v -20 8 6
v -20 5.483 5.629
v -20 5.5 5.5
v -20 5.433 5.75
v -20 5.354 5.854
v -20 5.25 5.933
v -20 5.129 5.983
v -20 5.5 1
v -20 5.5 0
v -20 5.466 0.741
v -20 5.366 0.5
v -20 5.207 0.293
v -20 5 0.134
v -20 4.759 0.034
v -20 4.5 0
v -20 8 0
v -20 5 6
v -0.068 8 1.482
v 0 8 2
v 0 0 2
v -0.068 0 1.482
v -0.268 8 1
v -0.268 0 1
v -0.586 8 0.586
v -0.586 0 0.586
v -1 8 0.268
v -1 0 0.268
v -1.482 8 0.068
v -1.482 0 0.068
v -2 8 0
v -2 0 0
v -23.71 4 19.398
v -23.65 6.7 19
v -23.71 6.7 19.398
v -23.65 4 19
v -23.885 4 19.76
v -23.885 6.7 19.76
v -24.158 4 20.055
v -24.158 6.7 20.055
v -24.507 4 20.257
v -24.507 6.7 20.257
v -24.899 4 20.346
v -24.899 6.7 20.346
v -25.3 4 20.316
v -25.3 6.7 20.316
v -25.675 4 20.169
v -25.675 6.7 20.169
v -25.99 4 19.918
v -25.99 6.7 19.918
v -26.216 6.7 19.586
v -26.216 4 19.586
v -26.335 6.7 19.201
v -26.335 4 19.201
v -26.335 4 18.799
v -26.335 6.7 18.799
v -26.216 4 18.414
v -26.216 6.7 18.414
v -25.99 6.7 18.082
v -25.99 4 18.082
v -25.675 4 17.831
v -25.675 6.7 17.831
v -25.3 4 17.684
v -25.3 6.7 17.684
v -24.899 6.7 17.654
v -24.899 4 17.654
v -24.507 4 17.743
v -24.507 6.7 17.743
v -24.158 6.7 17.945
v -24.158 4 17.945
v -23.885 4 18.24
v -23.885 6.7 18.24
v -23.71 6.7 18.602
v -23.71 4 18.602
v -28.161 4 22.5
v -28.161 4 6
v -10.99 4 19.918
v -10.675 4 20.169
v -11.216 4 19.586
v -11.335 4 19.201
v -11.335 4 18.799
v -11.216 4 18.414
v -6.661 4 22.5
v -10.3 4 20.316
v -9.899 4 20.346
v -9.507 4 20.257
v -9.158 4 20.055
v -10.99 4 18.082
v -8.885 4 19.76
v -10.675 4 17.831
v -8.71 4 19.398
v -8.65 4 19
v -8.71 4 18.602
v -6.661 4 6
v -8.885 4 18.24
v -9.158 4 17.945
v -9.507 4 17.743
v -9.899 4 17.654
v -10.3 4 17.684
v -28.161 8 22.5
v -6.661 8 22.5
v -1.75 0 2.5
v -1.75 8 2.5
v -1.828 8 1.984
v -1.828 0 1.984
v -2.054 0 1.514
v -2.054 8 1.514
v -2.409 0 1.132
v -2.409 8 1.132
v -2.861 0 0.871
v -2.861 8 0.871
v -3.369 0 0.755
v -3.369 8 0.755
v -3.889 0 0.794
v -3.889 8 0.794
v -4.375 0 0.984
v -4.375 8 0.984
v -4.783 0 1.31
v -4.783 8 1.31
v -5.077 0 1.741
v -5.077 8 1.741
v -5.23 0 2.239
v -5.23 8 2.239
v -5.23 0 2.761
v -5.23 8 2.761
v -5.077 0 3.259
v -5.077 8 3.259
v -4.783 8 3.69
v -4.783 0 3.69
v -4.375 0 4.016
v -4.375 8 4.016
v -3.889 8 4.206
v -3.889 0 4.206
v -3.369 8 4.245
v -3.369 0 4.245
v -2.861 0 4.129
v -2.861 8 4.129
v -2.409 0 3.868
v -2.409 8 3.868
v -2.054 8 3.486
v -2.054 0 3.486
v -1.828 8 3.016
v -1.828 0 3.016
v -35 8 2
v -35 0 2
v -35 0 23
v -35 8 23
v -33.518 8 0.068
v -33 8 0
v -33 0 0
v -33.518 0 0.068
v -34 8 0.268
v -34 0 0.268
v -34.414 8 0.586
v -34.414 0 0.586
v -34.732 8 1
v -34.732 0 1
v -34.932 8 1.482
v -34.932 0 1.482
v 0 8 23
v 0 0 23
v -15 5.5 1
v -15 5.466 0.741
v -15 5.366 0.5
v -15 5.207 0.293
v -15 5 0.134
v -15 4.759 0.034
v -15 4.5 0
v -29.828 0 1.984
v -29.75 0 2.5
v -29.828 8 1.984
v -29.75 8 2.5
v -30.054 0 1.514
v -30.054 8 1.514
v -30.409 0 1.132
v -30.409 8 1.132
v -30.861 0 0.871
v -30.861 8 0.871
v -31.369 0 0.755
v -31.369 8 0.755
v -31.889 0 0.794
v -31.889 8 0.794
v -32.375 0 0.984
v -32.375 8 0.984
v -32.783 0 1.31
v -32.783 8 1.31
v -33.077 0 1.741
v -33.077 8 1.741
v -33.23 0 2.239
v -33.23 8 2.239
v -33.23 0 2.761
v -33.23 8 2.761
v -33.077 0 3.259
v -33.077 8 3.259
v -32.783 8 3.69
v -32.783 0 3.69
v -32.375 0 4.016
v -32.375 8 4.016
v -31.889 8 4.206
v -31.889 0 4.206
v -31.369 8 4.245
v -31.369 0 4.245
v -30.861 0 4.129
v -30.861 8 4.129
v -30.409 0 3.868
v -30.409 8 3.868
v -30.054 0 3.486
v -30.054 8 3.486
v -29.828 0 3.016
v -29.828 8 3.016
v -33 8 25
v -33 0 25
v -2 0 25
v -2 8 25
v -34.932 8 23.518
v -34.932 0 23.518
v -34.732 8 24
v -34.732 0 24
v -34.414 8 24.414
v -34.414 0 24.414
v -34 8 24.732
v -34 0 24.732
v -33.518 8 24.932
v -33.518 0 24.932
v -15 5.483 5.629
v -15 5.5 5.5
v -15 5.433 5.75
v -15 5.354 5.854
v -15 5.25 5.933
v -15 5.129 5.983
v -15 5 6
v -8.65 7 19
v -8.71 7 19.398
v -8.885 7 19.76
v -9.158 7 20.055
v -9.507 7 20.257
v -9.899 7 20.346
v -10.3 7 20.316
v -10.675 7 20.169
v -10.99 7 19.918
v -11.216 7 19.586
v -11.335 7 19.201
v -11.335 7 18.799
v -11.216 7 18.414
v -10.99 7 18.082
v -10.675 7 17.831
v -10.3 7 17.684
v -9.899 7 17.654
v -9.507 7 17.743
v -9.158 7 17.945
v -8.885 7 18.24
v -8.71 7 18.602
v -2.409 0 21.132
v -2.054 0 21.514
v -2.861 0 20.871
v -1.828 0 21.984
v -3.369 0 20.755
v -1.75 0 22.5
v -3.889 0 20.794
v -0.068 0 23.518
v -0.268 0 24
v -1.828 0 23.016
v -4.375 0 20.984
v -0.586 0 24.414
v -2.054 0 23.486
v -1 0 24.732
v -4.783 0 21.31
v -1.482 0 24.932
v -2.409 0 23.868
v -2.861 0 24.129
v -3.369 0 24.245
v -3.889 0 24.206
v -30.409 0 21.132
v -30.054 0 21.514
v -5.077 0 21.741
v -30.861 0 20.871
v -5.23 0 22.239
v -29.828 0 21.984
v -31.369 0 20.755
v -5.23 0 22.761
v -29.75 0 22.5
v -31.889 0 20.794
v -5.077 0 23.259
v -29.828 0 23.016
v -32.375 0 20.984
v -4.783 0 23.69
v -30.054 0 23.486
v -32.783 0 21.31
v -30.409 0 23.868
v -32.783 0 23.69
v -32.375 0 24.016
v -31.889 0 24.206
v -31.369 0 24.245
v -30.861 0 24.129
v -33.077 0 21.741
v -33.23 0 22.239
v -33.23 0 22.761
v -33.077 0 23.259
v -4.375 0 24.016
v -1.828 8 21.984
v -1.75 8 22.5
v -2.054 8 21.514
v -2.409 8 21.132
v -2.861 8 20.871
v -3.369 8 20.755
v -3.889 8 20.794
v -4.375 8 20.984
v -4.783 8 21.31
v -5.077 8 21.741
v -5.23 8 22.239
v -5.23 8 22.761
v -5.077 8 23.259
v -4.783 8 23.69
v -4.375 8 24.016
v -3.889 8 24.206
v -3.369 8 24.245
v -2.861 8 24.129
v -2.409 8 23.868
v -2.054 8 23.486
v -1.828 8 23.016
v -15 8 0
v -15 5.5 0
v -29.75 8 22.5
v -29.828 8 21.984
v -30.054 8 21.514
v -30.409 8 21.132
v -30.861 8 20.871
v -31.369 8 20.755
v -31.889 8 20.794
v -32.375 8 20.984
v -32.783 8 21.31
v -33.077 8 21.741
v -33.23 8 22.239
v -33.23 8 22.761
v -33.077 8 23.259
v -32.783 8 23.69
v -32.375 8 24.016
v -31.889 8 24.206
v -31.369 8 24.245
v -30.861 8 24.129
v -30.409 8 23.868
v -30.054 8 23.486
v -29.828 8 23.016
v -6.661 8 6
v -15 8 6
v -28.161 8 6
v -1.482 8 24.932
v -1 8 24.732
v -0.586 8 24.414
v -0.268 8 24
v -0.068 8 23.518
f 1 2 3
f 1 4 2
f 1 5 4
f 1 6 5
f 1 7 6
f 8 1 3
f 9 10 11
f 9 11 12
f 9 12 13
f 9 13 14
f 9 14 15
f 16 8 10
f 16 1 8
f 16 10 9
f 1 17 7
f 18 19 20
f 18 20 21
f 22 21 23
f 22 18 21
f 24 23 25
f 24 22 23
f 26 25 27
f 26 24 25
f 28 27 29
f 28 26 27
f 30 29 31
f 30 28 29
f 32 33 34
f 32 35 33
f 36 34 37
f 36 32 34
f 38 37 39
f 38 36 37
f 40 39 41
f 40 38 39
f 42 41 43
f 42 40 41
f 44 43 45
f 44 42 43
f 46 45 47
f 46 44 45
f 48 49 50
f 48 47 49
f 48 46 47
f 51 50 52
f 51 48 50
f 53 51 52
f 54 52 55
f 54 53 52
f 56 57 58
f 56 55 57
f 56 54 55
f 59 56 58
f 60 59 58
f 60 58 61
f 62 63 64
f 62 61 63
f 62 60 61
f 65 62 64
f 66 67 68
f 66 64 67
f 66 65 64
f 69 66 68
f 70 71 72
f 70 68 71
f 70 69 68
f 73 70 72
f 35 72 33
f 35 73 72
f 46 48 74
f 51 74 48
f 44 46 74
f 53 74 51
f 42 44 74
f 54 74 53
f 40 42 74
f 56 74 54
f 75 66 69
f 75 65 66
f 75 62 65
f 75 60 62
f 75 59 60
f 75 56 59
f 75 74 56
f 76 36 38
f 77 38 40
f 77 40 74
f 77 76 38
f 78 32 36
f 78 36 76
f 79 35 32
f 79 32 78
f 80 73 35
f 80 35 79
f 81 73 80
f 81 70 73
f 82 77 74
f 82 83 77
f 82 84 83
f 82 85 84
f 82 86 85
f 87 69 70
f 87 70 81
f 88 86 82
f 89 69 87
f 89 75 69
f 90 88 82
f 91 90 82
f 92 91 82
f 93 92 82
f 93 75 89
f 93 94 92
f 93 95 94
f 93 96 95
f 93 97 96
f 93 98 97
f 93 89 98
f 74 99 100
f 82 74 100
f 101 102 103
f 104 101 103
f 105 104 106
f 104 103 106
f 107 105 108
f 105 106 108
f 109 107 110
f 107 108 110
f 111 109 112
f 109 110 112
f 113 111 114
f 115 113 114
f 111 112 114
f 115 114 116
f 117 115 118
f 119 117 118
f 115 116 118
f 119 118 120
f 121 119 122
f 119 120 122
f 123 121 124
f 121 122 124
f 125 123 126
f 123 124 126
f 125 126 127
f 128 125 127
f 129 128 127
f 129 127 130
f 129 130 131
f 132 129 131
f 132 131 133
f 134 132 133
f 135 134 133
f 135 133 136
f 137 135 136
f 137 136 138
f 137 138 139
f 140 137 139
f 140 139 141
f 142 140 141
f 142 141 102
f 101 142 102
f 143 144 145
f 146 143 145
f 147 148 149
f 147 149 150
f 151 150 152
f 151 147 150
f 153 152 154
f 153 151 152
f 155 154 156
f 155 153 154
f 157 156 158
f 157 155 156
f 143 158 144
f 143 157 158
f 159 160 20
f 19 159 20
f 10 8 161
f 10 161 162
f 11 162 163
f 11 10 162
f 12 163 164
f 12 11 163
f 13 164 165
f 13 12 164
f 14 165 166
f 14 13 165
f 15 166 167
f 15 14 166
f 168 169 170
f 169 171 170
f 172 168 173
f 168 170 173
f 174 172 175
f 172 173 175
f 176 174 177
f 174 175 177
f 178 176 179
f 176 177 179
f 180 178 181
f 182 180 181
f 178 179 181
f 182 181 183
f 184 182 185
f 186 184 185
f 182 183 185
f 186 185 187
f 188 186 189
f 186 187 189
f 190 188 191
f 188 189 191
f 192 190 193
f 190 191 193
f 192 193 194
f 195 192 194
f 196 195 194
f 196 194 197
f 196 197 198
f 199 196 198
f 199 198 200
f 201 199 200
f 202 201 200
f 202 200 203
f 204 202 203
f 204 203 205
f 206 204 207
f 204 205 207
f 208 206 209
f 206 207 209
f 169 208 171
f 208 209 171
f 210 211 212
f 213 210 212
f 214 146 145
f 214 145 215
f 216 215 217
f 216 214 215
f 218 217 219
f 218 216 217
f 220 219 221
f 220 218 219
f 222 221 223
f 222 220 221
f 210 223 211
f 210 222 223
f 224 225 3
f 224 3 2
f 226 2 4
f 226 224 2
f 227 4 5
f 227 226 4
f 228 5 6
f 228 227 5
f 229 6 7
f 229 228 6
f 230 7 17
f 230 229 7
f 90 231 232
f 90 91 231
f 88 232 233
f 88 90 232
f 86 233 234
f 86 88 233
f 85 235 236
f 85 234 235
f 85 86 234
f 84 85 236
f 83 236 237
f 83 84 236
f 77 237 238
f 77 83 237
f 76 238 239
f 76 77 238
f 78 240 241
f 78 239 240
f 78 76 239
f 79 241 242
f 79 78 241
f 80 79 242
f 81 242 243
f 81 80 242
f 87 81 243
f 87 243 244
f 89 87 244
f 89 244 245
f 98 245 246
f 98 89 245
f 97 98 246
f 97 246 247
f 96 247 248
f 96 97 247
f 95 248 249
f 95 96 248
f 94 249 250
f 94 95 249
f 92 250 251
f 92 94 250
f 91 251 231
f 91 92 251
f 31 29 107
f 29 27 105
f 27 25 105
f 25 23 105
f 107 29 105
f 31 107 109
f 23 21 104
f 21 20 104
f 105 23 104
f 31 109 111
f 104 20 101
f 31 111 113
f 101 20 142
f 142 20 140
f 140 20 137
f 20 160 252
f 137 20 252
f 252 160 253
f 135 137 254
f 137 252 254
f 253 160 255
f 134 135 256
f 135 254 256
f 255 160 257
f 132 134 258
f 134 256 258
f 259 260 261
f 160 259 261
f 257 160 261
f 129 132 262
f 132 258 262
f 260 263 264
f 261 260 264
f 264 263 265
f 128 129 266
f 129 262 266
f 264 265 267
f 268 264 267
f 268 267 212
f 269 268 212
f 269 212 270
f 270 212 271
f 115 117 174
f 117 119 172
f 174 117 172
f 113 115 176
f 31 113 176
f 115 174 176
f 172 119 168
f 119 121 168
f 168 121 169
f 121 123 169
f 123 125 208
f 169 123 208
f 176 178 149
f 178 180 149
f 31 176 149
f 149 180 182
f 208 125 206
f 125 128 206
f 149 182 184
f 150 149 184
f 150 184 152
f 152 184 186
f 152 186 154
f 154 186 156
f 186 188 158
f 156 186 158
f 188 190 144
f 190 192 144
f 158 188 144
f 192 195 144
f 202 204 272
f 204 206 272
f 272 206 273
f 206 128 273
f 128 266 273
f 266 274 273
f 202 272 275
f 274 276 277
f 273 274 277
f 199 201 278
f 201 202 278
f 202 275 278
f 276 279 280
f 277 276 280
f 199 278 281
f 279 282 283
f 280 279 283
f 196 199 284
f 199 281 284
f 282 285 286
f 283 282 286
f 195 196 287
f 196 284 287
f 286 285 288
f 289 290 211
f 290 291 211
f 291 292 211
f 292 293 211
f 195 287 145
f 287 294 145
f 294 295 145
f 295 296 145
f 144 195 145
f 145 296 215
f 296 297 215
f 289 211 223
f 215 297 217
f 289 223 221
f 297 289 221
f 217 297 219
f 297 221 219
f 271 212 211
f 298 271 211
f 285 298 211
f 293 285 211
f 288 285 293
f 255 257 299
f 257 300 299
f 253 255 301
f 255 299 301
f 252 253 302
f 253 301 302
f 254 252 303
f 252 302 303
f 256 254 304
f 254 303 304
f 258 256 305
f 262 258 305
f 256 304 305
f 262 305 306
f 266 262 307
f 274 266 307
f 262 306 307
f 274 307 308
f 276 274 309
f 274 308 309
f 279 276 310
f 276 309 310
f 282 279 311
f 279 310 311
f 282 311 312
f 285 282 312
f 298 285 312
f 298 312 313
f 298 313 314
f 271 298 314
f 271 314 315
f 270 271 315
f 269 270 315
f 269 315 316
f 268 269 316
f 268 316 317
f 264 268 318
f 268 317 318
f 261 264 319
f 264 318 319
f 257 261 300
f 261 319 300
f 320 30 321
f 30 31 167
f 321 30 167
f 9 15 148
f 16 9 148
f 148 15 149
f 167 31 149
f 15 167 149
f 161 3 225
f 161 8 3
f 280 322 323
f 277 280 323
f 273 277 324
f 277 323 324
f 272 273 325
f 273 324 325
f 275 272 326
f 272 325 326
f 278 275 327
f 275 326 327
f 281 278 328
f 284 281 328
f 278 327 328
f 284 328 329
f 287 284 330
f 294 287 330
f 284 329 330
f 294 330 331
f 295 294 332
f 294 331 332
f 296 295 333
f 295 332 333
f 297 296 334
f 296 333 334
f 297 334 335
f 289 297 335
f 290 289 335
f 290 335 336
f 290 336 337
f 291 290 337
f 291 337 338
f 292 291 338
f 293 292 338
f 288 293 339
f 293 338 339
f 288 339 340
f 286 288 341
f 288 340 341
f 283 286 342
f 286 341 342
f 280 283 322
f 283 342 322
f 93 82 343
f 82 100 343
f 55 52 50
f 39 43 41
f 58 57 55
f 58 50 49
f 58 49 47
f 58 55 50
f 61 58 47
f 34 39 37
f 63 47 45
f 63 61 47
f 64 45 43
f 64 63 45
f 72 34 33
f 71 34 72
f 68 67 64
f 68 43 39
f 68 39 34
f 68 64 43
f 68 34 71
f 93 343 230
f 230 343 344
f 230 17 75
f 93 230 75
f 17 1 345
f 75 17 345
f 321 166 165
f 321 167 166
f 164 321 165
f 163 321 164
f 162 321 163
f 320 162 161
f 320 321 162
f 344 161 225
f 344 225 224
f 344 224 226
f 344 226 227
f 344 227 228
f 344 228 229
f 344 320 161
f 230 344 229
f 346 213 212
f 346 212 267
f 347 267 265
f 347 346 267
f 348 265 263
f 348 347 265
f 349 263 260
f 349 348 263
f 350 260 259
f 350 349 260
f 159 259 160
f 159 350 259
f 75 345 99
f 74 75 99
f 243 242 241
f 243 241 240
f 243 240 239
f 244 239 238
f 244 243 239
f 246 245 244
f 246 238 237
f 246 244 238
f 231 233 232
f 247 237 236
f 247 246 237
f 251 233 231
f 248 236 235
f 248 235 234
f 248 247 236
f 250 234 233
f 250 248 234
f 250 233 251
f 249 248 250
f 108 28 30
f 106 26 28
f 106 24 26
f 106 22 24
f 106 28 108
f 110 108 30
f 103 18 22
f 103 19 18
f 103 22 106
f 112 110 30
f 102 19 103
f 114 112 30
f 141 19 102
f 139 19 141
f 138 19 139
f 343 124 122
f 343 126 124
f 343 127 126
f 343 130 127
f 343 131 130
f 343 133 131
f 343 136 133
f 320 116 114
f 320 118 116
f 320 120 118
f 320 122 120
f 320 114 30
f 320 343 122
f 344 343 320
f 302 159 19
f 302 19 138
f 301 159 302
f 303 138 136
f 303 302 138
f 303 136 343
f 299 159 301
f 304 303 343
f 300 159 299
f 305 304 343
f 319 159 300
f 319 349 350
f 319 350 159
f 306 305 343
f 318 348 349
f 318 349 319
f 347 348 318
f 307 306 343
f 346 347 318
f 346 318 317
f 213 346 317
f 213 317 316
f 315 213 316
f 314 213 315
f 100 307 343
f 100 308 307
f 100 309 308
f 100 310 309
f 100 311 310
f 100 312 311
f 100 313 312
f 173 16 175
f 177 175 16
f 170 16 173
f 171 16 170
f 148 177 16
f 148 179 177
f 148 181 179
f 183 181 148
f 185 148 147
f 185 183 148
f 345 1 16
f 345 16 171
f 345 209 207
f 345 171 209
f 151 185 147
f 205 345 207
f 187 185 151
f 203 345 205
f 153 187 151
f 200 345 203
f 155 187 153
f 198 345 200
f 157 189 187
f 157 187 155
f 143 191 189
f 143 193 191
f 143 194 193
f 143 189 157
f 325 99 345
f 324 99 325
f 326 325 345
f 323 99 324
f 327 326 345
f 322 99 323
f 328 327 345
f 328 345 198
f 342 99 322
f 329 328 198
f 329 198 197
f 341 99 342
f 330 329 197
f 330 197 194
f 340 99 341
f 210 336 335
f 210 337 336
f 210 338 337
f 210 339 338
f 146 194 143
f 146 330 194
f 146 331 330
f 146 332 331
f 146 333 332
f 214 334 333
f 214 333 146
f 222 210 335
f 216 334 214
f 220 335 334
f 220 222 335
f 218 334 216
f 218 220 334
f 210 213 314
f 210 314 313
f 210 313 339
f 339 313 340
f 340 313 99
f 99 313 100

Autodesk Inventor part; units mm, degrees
ref_plane "YZ Plane" through (0, 0, 0) normal (1, 0, 0) x (0, 1, 0)
ref_plane "XZ Plane" through (0, 0, 0) normal (0, 1, 0) x (-1, 0, 0)
ref_plane "XY Plane" through (0, 0, 0) normal (0, 0, 1) x (1, 0, 0)
sketch "Sketch1" plane through (0, 0, 0) normal (0, 1, 0) x (-1, 0, 0)
  point P0 (0, 0)
sketch "Sketch2" plane through (0, 0, 0) normal (0, 1, 0) x (-1, 0, 0)
  line L0 (0, 0) -> (35, 0)
  line L1 (35, 0) -> (35, 25)
  line L2 (35, 25) -> (0, 25)
  line L3 (0, 25) -> (0, 0)
  dimension "d0" = 35
  dimension "d1" = 25
extrude "Extrusion1" add sketch "Sketch2" along normal blind 8
sketch "Sketch3" plane through (0, 8, 0) normal (0, 1, 0) x (1, 0, 0)
  line L0 (-28.1608, -22.5) -> (-6.6608, -22.5)
  line L1 (-6.6608, -22.5) -> (-6.6608, -6)
  line L2 (-6.6608, -6) -> (-28.1608, -6)
  line L3 (-28.1608, -6) -> (-28.1608, -22.5)
  dimension "d4" = 21.5
  dimension "d5" = 16.5
extrude "Extrusion2" cut sketch "Sketch3" against normal blind 4
sketch "Sketch4" plane through (-6.6608, 8, 22.5) normal (0, 0, -1) x (-1, 0, 0)
  point P0 (-6.6608, -8)
sketch "Sketch5" plane through (-28.1608, 8, 6) normal (0, 0, 1) x (1, 0, 0)
  line L0 (0, -4) -> (21.5, -4)
  line L1 (21.5, -4) -> (21.5, 0)
  line L2 (21.5, 0) -> (0, 0)
  line L3 (0, 0) -> (0, -4)
  point P0 (28.1608, -8)
sketch "Sketch12" plane through (0, 8, 0) normal (0, 1, 0) x (1, 0, 0)
  line L0 (-28.1608, -6) -> (-6.6608, -6) projected
  line L1 (0, 0) -> (-35, 0) projected
  line L2 (-15, -6) -> (-20, -6)
  line L3 (-20, -6) -> (-20, 0)
  line L4 (-20, 0) -> (-15, 0)
  line L5 (-15, 0) -> (-15, -6)
  dimension "d27" = 5
extrude "Extrusion9" cut sketch "Sketch12" against normal blind 2.5
fillet "Fillet1" radius 2 1 edges at (-35, 4, 0)
fillet "Fillet2" radius 2 1 edges at (0, 4, 0)
fillet "Fillet3" radius 2 1 edges at (-35, 4, 25)
fillet "Fillet4" radius 2 1 edges at (0, 4, 25)
fillet "Fillet5" radius 0.5 1 edges at (-17.5, 5.5, 6)
sketch "Sketch13" plane through (0, 0, 0) normal (0, -1, 0) x (1, 0, 0)
  point P0 (0, 0)
sketch "Skizze18" plane through (0, 8, 0) normal (0, 1, 0) x (1, 0, 0)
  circle A0 centre (-3.5, -22.5) radius 1.75
  circle A1 centre (-3.5, -2.5) radius 1.75
  point P0 (0, 0)
  dimension "d47" = 3.5
  dimension "d48" = 3.5
extrude "Extrusion14" cut sketch "Skizze18" against normal blind 20 contours A0
extrude "Extrusion15" cut sketch "Skizze18" against normal blind 20 contours A1
sketch "Skizze19" plane through (0, 8, 0) normal (0, 1, 0) x (1, 0, 0)
  circle A0 centre (-31.5, -22.5) radius 1.75
  point P0 (0, 0)
  dimension "d53" = 3.5
extrude "Extrusion16" cut sketch "Skizze19" against normal blind 20
sketch "Skizze20" plane through (0, 8, 0) normal (0, 1, 0) x (1, 0, 0)
  circle A0 centre (-31.5, -2.5) radius 1.75
  point P0 (0, 0)
  dimension "d56" = 3.5
extrude "Extrusion17" cut sketch "Skizze20" against normal blind 20
sketch "Skizze21" plane through (0, 4, 0) normal (0, 1, 0) x (1, 0, 0)
  circle A0 centre (-10, -19) radius 1.5 projected
  circle A1 centre (-10, -19) radius 1.35
  point P0 (0, 0)
  dimension "d59" = 2.7
extrude "Extrusion18" add sketch "Skizze21" along normal blind 3 contours A1
sketch "Skizze22" plane through (0, 4, 0) normal (0, 1, 0) x (1, 0, 0)
  circle A0 centre (-25, -19) radius 1.5 projected
  circle A1 centre (-25, -19) radius 1.35
  point P0 (0, 0)
  dimension "d62" = 2.7
extrude "Extrusion19" add sketch "Skizze22" along normal blind 2.7 contours A1
fillet "Rundung6" radius 1 1 edges at (-17.5, 5.5, 0)
properties part number "MPU6050_CASE_BOTTOM"
